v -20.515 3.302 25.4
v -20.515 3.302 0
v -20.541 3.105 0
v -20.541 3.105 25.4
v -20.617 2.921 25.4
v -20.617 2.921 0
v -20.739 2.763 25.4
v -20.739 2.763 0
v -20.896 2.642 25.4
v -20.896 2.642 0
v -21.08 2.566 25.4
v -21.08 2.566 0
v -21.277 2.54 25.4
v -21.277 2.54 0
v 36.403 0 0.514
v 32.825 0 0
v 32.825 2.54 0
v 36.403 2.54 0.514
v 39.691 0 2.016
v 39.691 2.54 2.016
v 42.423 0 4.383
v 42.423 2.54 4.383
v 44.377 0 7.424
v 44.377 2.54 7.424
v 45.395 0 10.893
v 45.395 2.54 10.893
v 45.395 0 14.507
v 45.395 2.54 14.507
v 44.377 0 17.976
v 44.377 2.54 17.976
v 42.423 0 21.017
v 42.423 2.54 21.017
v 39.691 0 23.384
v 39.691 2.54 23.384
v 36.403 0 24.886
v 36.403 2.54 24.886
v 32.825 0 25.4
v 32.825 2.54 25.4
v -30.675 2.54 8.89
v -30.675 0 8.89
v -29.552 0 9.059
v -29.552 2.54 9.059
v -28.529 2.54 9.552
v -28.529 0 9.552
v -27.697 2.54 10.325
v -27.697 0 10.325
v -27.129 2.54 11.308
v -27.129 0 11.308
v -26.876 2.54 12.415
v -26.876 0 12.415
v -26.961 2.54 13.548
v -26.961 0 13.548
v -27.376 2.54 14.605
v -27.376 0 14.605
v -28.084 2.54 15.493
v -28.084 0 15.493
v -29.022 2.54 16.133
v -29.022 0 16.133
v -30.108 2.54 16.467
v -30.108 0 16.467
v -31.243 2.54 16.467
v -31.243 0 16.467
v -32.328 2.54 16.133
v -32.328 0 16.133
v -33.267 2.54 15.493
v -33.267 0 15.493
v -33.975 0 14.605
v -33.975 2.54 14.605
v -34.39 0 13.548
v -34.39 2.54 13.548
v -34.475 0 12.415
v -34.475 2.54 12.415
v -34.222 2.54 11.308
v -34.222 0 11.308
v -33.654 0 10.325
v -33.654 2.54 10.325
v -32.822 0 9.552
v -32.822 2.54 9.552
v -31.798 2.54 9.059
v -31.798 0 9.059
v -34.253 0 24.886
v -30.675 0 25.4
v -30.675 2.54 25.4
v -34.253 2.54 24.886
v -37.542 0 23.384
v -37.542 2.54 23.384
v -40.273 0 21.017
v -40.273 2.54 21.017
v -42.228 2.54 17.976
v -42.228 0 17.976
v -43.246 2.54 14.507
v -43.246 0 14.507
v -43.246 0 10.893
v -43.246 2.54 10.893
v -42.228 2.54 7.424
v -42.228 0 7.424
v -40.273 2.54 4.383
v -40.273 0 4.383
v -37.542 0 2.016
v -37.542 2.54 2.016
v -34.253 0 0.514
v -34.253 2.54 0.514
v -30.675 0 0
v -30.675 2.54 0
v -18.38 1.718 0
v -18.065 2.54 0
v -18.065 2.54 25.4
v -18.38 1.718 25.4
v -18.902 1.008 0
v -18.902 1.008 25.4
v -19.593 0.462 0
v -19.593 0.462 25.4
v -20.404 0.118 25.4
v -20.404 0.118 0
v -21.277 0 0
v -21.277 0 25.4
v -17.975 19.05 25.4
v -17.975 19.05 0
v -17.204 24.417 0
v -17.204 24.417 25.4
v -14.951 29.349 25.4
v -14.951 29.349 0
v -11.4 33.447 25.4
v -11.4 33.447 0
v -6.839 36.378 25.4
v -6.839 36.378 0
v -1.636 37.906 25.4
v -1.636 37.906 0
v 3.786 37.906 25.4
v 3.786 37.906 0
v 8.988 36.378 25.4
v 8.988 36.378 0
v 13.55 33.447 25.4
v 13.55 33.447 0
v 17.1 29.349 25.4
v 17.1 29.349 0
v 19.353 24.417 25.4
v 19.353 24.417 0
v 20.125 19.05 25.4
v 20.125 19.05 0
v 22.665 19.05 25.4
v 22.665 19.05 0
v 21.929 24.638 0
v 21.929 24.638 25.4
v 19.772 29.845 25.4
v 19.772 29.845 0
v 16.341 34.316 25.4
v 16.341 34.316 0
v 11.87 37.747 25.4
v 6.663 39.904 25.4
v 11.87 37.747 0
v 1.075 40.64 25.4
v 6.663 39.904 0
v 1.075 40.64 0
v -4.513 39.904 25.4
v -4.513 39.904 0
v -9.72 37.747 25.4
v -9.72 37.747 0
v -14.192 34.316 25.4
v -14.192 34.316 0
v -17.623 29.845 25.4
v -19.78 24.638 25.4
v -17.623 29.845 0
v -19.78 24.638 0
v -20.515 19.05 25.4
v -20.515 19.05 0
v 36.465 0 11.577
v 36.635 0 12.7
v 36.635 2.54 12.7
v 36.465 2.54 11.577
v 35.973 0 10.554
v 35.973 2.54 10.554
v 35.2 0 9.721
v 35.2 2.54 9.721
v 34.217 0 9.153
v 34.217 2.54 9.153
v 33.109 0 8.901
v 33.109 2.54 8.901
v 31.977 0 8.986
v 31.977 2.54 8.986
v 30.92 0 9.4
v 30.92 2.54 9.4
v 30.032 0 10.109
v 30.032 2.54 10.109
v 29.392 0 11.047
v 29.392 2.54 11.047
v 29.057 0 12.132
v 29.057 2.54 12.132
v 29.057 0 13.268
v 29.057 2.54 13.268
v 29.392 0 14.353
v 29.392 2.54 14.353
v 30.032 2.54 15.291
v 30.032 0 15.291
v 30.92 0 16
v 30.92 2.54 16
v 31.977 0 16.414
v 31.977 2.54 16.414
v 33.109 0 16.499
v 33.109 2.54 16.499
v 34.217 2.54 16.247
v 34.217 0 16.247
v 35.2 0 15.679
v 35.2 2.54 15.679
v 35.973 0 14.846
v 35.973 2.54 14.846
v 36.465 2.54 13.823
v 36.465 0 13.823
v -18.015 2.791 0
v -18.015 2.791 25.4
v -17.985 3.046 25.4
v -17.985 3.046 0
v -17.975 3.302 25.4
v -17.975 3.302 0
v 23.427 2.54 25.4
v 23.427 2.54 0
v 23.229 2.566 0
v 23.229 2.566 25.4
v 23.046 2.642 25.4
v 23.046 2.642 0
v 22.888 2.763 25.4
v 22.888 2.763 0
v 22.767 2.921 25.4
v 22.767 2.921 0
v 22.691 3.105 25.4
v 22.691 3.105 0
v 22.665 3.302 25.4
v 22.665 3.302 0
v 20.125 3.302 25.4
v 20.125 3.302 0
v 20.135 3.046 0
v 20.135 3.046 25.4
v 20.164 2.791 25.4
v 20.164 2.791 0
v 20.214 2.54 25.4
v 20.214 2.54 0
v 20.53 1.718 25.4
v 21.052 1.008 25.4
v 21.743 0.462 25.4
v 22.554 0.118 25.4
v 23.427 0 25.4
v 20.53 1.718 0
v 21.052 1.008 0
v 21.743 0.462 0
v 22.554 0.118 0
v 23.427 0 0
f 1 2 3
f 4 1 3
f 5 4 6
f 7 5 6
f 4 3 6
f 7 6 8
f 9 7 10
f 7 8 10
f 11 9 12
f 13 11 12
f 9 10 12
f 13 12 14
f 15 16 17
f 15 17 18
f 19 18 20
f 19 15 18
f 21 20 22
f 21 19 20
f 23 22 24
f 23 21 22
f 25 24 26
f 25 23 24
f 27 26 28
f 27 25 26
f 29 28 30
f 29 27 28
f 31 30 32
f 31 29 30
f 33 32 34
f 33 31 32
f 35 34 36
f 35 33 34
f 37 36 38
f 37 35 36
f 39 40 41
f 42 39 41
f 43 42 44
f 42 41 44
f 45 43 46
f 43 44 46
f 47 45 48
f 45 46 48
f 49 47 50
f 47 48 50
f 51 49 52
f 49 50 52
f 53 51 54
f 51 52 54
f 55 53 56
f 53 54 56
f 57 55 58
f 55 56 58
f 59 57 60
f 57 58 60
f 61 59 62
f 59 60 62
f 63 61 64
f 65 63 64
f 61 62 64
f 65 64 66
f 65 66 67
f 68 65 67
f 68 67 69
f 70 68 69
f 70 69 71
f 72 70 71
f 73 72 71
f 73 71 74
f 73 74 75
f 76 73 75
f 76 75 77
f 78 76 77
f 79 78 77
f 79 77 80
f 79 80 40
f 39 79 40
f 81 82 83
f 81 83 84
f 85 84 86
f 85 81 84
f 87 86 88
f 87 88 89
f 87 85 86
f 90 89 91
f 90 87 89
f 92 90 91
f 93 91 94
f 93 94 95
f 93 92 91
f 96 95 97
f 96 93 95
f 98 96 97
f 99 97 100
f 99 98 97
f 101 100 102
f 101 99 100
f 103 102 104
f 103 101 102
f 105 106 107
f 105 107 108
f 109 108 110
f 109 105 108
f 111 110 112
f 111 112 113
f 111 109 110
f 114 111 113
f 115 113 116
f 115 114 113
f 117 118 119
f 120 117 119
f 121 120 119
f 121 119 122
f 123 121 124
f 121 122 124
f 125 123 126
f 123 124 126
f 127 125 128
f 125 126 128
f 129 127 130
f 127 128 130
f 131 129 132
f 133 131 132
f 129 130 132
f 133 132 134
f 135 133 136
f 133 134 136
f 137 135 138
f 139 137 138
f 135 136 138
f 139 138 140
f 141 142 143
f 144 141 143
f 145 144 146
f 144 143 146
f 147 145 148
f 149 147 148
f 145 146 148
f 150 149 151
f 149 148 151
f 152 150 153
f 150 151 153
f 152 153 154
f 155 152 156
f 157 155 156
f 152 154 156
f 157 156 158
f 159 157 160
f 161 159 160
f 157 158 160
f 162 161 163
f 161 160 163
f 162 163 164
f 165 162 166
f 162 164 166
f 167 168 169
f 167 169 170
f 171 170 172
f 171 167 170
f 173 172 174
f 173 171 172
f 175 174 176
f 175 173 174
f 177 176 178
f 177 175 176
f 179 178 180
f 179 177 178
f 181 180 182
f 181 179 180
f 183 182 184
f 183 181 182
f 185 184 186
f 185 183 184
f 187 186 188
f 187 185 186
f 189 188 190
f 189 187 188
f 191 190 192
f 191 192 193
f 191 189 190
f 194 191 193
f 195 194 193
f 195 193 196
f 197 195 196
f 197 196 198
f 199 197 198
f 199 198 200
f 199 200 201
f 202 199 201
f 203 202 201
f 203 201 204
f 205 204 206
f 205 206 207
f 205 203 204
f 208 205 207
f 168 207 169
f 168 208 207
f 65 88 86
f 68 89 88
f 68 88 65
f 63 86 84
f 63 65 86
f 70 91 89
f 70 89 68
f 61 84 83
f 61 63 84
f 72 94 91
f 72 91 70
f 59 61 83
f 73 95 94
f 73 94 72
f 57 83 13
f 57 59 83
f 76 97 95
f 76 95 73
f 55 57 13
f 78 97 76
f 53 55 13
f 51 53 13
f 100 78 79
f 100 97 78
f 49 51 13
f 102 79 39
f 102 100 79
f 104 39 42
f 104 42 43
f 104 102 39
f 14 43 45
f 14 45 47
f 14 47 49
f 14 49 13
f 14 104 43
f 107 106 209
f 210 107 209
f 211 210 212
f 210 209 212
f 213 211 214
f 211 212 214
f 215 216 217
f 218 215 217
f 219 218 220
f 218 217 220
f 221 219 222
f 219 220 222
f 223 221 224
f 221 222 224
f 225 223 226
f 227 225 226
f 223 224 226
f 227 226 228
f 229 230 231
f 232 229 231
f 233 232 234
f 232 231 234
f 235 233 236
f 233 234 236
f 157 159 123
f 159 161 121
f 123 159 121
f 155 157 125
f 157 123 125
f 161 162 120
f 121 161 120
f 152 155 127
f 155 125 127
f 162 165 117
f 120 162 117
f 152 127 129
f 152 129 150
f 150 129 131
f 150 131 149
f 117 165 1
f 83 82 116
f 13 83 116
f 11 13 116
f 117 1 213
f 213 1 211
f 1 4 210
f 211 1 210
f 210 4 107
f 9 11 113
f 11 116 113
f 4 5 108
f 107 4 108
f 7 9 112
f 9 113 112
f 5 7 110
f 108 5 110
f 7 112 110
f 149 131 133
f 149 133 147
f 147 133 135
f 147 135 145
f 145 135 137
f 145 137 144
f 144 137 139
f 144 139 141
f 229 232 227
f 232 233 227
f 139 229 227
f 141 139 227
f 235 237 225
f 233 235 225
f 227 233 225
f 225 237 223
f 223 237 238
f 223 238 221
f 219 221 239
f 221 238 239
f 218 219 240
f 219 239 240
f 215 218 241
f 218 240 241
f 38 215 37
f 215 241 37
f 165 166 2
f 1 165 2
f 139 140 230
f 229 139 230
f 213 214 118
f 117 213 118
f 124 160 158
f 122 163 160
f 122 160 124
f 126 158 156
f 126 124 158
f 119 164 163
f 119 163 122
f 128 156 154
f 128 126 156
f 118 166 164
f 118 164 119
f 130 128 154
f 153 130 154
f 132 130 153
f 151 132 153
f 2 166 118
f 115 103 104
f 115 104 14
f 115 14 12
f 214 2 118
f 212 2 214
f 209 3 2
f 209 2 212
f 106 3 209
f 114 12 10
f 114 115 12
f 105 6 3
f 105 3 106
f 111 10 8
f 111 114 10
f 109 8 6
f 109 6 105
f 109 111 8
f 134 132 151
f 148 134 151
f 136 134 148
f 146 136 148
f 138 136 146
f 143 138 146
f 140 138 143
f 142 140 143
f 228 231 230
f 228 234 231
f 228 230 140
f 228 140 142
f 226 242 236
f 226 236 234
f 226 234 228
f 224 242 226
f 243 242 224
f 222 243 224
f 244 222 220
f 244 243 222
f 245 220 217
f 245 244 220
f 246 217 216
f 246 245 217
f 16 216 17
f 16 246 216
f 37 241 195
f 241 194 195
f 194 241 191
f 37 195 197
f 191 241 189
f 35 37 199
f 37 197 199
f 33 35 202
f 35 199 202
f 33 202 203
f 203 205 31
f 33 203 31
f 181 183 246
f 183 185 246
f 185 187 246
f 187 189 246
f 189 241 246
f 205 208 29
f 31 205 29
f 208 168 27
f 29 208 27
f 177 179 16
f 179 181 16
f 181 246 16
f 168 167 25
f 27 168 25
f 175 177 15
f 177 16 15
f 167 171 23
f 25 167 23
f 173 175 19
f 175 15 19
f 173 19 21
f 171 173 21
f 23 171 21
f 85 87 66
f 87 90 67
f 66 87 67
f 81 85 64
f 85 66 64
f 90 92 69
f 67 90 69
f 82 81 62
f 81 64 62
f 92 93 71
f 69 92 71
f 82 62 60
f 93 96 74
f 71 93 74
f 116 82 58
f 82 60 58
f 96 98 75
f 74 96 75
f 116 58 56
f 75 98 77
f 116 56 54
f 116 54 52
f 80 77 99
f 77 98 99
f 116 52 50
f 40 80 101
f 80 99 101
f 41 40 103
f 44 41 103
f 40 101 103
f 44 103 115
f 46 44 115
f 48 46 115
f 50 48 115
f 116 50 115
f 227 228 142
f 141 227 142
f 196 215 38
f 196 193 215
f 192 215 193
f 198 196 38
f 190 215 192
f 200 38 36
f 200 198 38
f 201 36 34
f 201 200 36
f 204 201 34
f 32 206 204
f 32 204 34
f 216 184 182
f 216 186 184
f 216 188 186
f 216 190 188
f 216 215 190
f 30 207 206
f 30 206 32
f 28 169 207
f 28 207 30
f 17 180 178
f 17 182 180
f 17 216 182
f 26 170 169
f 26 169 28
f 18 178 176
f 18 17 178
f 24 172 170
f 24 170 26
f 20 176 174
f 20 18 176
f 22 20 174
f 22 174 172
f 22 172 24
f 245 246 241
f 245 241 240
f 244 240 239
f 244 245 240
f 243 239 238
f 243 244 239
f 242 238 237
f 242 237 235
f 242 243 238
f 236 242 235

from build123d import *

# Parameters (mm, degrees)
BOSS_EXTRUDE1_DEPTH        = 25.4
SKETCH3_R                  = 3.81
CUT_EXTRUDE1_DEPTH         = 67.100379771
FILLET1_RADIUS             = 12.7
FILLET1_LENGTH             = 2.54
FILLET2_RADIUS             = 12.7
FILLET2_LENGTH             = 2.54
FILLET4_R                  = 19.05
FILLET5_RADIUS             = 21.59
FILLET5_LENGTH             = 25.4
FLATTEN_BENDS3_START       = 2.54
FLATTEN_BENDS3_OUTLINE_W   = 43.18
FLATTEN_BENDS3_OUTLINE_H   = 25.4
FLATTEN_BENDS3_DEPTH       = 38.1
FLATTEN_BENDS3_2_OUTLINE_W = 38.1
FLATTEN_BENDS3_2_OUTLINE_H = 25.4
FLATTEN_BENDS3_2_OUTLINE_R = 3.81
FLATTEN_BENDS3_2_DEPTH     = 2.54
PROCESS_BENDS3_DEPTH       = 25.4
PROCESS_BENDS3_2_OUTLINE_R = 3.81
PROCESS_BENDS3_2_DEPTH     = 2.54
PROCESS_BENDS3_3_DEPTH     = 25.4


# Read off the part's stored shape, not the designer's step: Flatten-Bends3, Process-Bends3
with BuildPart() as part:
    # Sketch2 → Boss-Extrude1 (new body)
    with BuildSketch(Plane.XY):
        Polygon((-43.375384615, 0), (-17.975384615, 0), (-17.975384615, 38.1), (20.124615385, 38.1), (20.124615385, 0), (45.524615385, 0), (45.524615385, 2.54), (22.664615385, 2.54), (22.664615385, 40.64), (-20.515384615, 40.64), (-20.515384615, 2.54), (-43.375384615, 2.54), align=None)
    extrude(amount=BOSS_EXTRUDE1_DEPTH)

    # Sketch3 → Cut-Extrude1 (cut, through all)
    with BuildSketch(Plane.XZ):
        with Locations(Location((-30.675384615, 12.7, 0), (0, 0, 270))):
            Circle(SKETCH3_R)
        with Locations(Location((32.824615385, 12.7, 0), (0, 0, 270))):
            Circle(SKETCH3_R)
    extrude(amount=-CUT_EXTRUDE1_DEPTH, mode=Mode.SUBTRACT)

    # Fillet1: full round fillet: the end face becomes a half cylinder, R = half its width
    fillet1_face = Plane((45.524615385, 1.27, 12.7), x_dir=(0, 1, 0), z_dir=(1, 0, 0))  # on the end face: x along it, z out of the body
    fillet1_slab = fillet1_face.offset(-FILLET1_RADIUS / 2) * Box(FILLET1_LENGTH, 2 * FILLET1_RADIUS, FILLET1_RADIUS, mode=Mode.PRIVATE)  # the body's end, R deep
    fillet1_round = Plane((32.824615385, 1.27, 12.7), x_dir=(1, 0, 0), z_dir=(0, 1, 0)) * Cylinder(FILLET1_RADIUS, FILLET1_LENGTH, mode=Mode.PRIVATE)  # its axis R under the face
    add(fillet1_slab - fillet1_round, mode=Mode.SUBTRACT)

    # Fillet2: full round fillet: the end face becomes a half cylinder, R = half its width
    fillet2_face = Plane((-43.375384615, 1.27, 12.7), x_dir=(0, -1, 0), z_dir=(-1, 0, 0))  # on the end face: x along it, z out of the body
    fillet2_slab = fillet2_face.offset(-FILLET2_RADIUS / 2) * Box(FILLET2_LENGTH, 2 * FILLET2_RADIUS, FILLET2_RADIUS, mode=Mode.PRIVATE)  # the body's end, R deep
    fillet2_round = Plane((-30.675384615, 1.27, 12.7), x_dir=(-1, 0, 0), z_dir=(0, -1, 0)) * Cylinder(FILLET2_RADIUS, FILLET2_LENGTH, mode=Mode.PRIVATE)  # its axis R under the face
    add(fillet2_slab - fillet2_round, mode=Mode.SUBTRACT)

    # Fillet4
    fillet4_edges = [part.edges().sort_by_distance(p)[0] for p in [
        (20.124615385, 38.1, 12.7),
        (-17.975384615, 38.1, 12.7),
    ]]
    fillet(fillet4_edges, radius=FILLET4_R - 0.0001)  # a hair under: the kernel refuses the full size

    # Fillet5: full round fillet: the end face becomes a half cylinder, R = half its width
    fillet5_face = Plane((1.074615385, 40.64, 12.7), x_dir=(0, 0, 1), z_dir=(0, 1, 0))  # on the end face: x along it, z out of the body
    fillet5_slab = fillet5_face.offset(-FILLET5_RADIUS / 2) * Box(FILLET5_LENGTH, 2 * FILLET5_RADIUS, FILLET5_RADIUS, mode=Mode.PRIVATE)  # the body's end, R deep
    fillet5_round = Plane((1.074615385, 19.05, 12.7), x_dir=(0, 1, 0), z_dir=(0, 0, 1)) * Cylinder(FILLET5_RADIUS, FILLET5_LENGTH, mode=Mode.PRIVATE)  # its axis R under the face
    add(fillet5_slab - fillet5_round, mode=Mode.SUBTRACT)

    # Flatten-Bends3 outline → Flatten-Bends3 (cut)
    with BuildSketch(Plane(origin=(0, 0, 0), x_dir=(1, 0, 0), z_dir=(0, 1, 0)).offset(FLATTEN_BENDS3_START)):
        with Locations((1.074615385, -12.7)):
            Rectangle(FLATTEN_BENDS3_OUTLINE_W, FLATTEN_BENDS3_OUTLINE_H)
    extrude(amount=FLATTEN_BENDS3_DEPTH, mode=Mode.SUBTRACT)

    # Flatten-Bends3 2 outline → Flatten-Bends3 2 (add)
    # profile 1 of 3: a face of its own
    with BuildSketch(Plane(origin=(0, 0, 0), x_dir=(1, 0, 0), z_dir=(0, 1, 0))):
        with Locations((1.074615385, -12.7)):
            Rectangle(FLATTEN_BENDS3_2_OUTLINE_W, FLATTEN_BENDS3_2_OUTLINE_H)
    # profile 2 of 3: a face of its own
    with BuildSketch(Plane(origin=(0, 0, 0), x_dir=(1, 0, 0), z_dir=(0, 1, 0))):
        with BuildLine():
            ThreePointArc((32.824615385, 0), (45.524615385, -12.7), (32.824615385, -25.4))
            Line((32.824615385, -25.4), (89.837494378, -25.4))
            ThreePointArc((89.837494378, -25.4), (102.537494378, -12.7), (89.837494378, 0))
            Line((89.837494378, 0), (32.824615385, 0))
        make_face()
        with Locations((89.837494378, -12.7)):
            Circle(FLATTEN_BENDS3_2_OUTLINE_R, mode=Mode.SUBTRACT)
    # profile 3 of 3: a face of its own
    with BuildSketch(Plane(origin=(0, 0, 0), x_dir=(1, 0, 0), z_dir=(0, 1, 0))):
        with Locations((32.824615385, -12.7)):
            Circle(FLATTEN_BENDS3_2_OUTLINE_R)
    extrude(amount=FLATTEN_BENDS3_2_DEPTH)

    # Process-Bends3 outline → Process-Bends3 (add)
    with BuildSketch(Plane.XY):
        with BuildLine():
            Line((22.664615385, 3.302), (22.664615385, 19.05))
            ThreePointArc((22.664615385, 19.05), (1.074615385, 40.64), (-20.515384615, 19.05))
            Line((-20.515384615, 19.05), (-20.515384615, 3.302))
            ThreePointArc((-20.515384615, 3.302), (-20.738569248, 2.763184633), (-21.277384615, 2.54))
            Line((-21.277384615, 2.54), (-18.064510513, 2.54))
            ThreePointArc((-18.064510513, 2.54), (-17.997741777, 2.918402742), (-17.975384615, 3.302))
            Line((-17.975384615, 3.302), (-17.975384615, 19.05))
            ThreePointArc((-17.975384615, 19.05), (1.074615385, 38.1), (20.124615385, 19.05))
            Line((20.124615385, 19.05), (20.124615385, 3.302))
            ThreePointArc((20.124615385, 3.302), (20.146972547, 2.918402742), (20.213741282, 2.54))
            Line((20.213741282, 2.54), (23.426615385, 2.54))
            ThreePointArc((23.426615385, 2.54), (22.887800018, 2.763184632), (22.664615385, 3.302))
        make_face()
    extrude(amount=PROCESS_BENDS3_DEPTH)

    # Process-Bends3 2 outline → Process-Bends3 2 (cut)
    # profile 1 of 2: a face of its own
    with BuildSketch(Plane(origin=(0, 0, 0), x_dir=(1, 0, 0), z_dir=(0, 1, 0))):
        with Locations((32.824615385, -12.7)):
            Circle(PROCESS_BENDS3_2_OUTLINE_R)
    # profile 2 of 2: a face of its own
    with BuildSketch(Plane(origin=(0, 0, 0), x_dir=(1, 0, 0), z_dir=(0, 1, 0))):
        with BuildLine():
            Line((89.837494378, 0), (32.824615385, 0))
            ThreePointArc((32.824615385, 0), (45.524615385, -12.7), (32.824615385, -25.4))
            Line((32.824615385, -25.4), (89.837494378, -25.4))
            ThreePointArc((89.837494378, -25.4), (102.537494378, -12.7), (89.837494378, 0))
        make_face()
        with Locations((89.837494378, -12.7)):
            Circle(PROCESS_BENDS3_2_OUTLINE_R, mode=Mode.SUBTRACT)
    extrude(amount=PROCESS_BENDS3_2_DEPTH, mode=Mode.SUBTRACT)

    # Process-Bends3 3 outline → Process-Bends3 3 (cut)
    with BuildSketch(Plane.XY):
        with BuildLine():
            ThreePointArc((23.426615385, 0), (21.378801917, 0.711698087), (20.213741282, 2.54))
            Line((20.213741282, 2.54), (-18.064510513, 2.54))
            ThreePointArc((-18.064510513, 2.54), (-19.229571147, 0.711698088), (-21.277384615, 0))
            Line((-21.277384615, 0), (23.426615385, 0))
        make_face()
    extrude(amount=PROCESS_BENDS3_3_DEPTH, mode=Mode.SUBTRACT)


solid = part.part
